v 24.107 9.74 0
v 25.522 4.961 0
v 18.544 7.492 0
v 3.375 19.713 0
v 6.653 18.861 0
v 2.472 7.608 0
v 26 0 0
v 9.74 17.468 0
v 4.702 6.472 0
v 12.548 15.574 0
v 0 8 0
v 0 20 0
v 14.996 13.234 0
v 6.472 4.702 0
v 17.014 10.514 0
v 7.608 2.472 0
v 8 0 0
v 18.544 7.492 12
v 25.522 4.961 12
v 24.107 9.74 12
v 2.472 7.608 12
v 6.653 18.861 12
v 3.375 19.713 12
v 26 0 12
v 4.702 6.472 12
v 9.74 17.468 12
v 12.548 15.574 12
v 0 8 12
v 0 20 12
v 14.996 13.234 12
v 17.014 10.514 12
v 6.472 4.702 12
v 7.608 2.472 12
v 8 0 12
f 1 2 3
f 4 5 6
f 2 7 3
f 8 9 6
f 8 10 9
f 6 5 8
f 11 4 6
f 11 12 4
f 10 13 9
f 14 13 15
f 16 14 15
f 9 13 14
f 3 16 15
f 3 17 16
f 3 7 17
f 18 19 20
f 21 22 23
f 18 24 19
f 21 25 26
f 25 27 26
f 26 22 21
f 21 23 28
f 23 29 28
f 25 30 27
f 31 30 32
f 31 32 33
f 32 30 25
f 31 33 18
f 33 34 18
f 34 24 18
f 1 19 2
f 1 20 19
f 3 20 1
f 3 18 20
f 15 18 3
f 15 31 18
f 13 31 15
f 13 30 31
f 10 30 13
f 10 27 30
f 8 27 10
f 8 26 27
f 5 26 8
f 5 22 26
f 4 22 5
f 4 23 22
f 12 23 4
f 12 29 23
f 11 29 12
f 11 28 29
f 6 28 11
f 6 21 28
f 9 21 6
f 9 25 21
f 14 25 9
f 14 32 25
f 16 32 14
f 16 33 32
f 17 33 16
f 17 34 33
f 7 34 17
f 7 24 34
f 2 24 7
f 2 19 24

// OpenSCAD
$fn = 32;

// ----------------------------------------------------------------------
// Arc stop: segment, 12 mm thick
// ----------------------------------------------------------------------

// --- parameters (mm) ---
profile_height = 12;      // extrusion height
profile_points = 17;      // points of the closed outline

profile = [[26, 0], [25.522, 4.961], [24.107, 9.74], [18.544, 7.492], [17.014, 10.514], [14.996, 13.234], [12.548, 15.574], [9.74, 17.468], [6.653, 18.861], [3.375, 19.713], [0, 20], [0, 8], [2.472, 7.608], [4.702, 6.472], [6.472, 4.702], [7.608, 2.472], [8, 0]];  // single closed polygon, 17 points, counter clockwise

// --- the one profile operation ---
linear_extrude(height = profile_height) polygon(points = profile);
